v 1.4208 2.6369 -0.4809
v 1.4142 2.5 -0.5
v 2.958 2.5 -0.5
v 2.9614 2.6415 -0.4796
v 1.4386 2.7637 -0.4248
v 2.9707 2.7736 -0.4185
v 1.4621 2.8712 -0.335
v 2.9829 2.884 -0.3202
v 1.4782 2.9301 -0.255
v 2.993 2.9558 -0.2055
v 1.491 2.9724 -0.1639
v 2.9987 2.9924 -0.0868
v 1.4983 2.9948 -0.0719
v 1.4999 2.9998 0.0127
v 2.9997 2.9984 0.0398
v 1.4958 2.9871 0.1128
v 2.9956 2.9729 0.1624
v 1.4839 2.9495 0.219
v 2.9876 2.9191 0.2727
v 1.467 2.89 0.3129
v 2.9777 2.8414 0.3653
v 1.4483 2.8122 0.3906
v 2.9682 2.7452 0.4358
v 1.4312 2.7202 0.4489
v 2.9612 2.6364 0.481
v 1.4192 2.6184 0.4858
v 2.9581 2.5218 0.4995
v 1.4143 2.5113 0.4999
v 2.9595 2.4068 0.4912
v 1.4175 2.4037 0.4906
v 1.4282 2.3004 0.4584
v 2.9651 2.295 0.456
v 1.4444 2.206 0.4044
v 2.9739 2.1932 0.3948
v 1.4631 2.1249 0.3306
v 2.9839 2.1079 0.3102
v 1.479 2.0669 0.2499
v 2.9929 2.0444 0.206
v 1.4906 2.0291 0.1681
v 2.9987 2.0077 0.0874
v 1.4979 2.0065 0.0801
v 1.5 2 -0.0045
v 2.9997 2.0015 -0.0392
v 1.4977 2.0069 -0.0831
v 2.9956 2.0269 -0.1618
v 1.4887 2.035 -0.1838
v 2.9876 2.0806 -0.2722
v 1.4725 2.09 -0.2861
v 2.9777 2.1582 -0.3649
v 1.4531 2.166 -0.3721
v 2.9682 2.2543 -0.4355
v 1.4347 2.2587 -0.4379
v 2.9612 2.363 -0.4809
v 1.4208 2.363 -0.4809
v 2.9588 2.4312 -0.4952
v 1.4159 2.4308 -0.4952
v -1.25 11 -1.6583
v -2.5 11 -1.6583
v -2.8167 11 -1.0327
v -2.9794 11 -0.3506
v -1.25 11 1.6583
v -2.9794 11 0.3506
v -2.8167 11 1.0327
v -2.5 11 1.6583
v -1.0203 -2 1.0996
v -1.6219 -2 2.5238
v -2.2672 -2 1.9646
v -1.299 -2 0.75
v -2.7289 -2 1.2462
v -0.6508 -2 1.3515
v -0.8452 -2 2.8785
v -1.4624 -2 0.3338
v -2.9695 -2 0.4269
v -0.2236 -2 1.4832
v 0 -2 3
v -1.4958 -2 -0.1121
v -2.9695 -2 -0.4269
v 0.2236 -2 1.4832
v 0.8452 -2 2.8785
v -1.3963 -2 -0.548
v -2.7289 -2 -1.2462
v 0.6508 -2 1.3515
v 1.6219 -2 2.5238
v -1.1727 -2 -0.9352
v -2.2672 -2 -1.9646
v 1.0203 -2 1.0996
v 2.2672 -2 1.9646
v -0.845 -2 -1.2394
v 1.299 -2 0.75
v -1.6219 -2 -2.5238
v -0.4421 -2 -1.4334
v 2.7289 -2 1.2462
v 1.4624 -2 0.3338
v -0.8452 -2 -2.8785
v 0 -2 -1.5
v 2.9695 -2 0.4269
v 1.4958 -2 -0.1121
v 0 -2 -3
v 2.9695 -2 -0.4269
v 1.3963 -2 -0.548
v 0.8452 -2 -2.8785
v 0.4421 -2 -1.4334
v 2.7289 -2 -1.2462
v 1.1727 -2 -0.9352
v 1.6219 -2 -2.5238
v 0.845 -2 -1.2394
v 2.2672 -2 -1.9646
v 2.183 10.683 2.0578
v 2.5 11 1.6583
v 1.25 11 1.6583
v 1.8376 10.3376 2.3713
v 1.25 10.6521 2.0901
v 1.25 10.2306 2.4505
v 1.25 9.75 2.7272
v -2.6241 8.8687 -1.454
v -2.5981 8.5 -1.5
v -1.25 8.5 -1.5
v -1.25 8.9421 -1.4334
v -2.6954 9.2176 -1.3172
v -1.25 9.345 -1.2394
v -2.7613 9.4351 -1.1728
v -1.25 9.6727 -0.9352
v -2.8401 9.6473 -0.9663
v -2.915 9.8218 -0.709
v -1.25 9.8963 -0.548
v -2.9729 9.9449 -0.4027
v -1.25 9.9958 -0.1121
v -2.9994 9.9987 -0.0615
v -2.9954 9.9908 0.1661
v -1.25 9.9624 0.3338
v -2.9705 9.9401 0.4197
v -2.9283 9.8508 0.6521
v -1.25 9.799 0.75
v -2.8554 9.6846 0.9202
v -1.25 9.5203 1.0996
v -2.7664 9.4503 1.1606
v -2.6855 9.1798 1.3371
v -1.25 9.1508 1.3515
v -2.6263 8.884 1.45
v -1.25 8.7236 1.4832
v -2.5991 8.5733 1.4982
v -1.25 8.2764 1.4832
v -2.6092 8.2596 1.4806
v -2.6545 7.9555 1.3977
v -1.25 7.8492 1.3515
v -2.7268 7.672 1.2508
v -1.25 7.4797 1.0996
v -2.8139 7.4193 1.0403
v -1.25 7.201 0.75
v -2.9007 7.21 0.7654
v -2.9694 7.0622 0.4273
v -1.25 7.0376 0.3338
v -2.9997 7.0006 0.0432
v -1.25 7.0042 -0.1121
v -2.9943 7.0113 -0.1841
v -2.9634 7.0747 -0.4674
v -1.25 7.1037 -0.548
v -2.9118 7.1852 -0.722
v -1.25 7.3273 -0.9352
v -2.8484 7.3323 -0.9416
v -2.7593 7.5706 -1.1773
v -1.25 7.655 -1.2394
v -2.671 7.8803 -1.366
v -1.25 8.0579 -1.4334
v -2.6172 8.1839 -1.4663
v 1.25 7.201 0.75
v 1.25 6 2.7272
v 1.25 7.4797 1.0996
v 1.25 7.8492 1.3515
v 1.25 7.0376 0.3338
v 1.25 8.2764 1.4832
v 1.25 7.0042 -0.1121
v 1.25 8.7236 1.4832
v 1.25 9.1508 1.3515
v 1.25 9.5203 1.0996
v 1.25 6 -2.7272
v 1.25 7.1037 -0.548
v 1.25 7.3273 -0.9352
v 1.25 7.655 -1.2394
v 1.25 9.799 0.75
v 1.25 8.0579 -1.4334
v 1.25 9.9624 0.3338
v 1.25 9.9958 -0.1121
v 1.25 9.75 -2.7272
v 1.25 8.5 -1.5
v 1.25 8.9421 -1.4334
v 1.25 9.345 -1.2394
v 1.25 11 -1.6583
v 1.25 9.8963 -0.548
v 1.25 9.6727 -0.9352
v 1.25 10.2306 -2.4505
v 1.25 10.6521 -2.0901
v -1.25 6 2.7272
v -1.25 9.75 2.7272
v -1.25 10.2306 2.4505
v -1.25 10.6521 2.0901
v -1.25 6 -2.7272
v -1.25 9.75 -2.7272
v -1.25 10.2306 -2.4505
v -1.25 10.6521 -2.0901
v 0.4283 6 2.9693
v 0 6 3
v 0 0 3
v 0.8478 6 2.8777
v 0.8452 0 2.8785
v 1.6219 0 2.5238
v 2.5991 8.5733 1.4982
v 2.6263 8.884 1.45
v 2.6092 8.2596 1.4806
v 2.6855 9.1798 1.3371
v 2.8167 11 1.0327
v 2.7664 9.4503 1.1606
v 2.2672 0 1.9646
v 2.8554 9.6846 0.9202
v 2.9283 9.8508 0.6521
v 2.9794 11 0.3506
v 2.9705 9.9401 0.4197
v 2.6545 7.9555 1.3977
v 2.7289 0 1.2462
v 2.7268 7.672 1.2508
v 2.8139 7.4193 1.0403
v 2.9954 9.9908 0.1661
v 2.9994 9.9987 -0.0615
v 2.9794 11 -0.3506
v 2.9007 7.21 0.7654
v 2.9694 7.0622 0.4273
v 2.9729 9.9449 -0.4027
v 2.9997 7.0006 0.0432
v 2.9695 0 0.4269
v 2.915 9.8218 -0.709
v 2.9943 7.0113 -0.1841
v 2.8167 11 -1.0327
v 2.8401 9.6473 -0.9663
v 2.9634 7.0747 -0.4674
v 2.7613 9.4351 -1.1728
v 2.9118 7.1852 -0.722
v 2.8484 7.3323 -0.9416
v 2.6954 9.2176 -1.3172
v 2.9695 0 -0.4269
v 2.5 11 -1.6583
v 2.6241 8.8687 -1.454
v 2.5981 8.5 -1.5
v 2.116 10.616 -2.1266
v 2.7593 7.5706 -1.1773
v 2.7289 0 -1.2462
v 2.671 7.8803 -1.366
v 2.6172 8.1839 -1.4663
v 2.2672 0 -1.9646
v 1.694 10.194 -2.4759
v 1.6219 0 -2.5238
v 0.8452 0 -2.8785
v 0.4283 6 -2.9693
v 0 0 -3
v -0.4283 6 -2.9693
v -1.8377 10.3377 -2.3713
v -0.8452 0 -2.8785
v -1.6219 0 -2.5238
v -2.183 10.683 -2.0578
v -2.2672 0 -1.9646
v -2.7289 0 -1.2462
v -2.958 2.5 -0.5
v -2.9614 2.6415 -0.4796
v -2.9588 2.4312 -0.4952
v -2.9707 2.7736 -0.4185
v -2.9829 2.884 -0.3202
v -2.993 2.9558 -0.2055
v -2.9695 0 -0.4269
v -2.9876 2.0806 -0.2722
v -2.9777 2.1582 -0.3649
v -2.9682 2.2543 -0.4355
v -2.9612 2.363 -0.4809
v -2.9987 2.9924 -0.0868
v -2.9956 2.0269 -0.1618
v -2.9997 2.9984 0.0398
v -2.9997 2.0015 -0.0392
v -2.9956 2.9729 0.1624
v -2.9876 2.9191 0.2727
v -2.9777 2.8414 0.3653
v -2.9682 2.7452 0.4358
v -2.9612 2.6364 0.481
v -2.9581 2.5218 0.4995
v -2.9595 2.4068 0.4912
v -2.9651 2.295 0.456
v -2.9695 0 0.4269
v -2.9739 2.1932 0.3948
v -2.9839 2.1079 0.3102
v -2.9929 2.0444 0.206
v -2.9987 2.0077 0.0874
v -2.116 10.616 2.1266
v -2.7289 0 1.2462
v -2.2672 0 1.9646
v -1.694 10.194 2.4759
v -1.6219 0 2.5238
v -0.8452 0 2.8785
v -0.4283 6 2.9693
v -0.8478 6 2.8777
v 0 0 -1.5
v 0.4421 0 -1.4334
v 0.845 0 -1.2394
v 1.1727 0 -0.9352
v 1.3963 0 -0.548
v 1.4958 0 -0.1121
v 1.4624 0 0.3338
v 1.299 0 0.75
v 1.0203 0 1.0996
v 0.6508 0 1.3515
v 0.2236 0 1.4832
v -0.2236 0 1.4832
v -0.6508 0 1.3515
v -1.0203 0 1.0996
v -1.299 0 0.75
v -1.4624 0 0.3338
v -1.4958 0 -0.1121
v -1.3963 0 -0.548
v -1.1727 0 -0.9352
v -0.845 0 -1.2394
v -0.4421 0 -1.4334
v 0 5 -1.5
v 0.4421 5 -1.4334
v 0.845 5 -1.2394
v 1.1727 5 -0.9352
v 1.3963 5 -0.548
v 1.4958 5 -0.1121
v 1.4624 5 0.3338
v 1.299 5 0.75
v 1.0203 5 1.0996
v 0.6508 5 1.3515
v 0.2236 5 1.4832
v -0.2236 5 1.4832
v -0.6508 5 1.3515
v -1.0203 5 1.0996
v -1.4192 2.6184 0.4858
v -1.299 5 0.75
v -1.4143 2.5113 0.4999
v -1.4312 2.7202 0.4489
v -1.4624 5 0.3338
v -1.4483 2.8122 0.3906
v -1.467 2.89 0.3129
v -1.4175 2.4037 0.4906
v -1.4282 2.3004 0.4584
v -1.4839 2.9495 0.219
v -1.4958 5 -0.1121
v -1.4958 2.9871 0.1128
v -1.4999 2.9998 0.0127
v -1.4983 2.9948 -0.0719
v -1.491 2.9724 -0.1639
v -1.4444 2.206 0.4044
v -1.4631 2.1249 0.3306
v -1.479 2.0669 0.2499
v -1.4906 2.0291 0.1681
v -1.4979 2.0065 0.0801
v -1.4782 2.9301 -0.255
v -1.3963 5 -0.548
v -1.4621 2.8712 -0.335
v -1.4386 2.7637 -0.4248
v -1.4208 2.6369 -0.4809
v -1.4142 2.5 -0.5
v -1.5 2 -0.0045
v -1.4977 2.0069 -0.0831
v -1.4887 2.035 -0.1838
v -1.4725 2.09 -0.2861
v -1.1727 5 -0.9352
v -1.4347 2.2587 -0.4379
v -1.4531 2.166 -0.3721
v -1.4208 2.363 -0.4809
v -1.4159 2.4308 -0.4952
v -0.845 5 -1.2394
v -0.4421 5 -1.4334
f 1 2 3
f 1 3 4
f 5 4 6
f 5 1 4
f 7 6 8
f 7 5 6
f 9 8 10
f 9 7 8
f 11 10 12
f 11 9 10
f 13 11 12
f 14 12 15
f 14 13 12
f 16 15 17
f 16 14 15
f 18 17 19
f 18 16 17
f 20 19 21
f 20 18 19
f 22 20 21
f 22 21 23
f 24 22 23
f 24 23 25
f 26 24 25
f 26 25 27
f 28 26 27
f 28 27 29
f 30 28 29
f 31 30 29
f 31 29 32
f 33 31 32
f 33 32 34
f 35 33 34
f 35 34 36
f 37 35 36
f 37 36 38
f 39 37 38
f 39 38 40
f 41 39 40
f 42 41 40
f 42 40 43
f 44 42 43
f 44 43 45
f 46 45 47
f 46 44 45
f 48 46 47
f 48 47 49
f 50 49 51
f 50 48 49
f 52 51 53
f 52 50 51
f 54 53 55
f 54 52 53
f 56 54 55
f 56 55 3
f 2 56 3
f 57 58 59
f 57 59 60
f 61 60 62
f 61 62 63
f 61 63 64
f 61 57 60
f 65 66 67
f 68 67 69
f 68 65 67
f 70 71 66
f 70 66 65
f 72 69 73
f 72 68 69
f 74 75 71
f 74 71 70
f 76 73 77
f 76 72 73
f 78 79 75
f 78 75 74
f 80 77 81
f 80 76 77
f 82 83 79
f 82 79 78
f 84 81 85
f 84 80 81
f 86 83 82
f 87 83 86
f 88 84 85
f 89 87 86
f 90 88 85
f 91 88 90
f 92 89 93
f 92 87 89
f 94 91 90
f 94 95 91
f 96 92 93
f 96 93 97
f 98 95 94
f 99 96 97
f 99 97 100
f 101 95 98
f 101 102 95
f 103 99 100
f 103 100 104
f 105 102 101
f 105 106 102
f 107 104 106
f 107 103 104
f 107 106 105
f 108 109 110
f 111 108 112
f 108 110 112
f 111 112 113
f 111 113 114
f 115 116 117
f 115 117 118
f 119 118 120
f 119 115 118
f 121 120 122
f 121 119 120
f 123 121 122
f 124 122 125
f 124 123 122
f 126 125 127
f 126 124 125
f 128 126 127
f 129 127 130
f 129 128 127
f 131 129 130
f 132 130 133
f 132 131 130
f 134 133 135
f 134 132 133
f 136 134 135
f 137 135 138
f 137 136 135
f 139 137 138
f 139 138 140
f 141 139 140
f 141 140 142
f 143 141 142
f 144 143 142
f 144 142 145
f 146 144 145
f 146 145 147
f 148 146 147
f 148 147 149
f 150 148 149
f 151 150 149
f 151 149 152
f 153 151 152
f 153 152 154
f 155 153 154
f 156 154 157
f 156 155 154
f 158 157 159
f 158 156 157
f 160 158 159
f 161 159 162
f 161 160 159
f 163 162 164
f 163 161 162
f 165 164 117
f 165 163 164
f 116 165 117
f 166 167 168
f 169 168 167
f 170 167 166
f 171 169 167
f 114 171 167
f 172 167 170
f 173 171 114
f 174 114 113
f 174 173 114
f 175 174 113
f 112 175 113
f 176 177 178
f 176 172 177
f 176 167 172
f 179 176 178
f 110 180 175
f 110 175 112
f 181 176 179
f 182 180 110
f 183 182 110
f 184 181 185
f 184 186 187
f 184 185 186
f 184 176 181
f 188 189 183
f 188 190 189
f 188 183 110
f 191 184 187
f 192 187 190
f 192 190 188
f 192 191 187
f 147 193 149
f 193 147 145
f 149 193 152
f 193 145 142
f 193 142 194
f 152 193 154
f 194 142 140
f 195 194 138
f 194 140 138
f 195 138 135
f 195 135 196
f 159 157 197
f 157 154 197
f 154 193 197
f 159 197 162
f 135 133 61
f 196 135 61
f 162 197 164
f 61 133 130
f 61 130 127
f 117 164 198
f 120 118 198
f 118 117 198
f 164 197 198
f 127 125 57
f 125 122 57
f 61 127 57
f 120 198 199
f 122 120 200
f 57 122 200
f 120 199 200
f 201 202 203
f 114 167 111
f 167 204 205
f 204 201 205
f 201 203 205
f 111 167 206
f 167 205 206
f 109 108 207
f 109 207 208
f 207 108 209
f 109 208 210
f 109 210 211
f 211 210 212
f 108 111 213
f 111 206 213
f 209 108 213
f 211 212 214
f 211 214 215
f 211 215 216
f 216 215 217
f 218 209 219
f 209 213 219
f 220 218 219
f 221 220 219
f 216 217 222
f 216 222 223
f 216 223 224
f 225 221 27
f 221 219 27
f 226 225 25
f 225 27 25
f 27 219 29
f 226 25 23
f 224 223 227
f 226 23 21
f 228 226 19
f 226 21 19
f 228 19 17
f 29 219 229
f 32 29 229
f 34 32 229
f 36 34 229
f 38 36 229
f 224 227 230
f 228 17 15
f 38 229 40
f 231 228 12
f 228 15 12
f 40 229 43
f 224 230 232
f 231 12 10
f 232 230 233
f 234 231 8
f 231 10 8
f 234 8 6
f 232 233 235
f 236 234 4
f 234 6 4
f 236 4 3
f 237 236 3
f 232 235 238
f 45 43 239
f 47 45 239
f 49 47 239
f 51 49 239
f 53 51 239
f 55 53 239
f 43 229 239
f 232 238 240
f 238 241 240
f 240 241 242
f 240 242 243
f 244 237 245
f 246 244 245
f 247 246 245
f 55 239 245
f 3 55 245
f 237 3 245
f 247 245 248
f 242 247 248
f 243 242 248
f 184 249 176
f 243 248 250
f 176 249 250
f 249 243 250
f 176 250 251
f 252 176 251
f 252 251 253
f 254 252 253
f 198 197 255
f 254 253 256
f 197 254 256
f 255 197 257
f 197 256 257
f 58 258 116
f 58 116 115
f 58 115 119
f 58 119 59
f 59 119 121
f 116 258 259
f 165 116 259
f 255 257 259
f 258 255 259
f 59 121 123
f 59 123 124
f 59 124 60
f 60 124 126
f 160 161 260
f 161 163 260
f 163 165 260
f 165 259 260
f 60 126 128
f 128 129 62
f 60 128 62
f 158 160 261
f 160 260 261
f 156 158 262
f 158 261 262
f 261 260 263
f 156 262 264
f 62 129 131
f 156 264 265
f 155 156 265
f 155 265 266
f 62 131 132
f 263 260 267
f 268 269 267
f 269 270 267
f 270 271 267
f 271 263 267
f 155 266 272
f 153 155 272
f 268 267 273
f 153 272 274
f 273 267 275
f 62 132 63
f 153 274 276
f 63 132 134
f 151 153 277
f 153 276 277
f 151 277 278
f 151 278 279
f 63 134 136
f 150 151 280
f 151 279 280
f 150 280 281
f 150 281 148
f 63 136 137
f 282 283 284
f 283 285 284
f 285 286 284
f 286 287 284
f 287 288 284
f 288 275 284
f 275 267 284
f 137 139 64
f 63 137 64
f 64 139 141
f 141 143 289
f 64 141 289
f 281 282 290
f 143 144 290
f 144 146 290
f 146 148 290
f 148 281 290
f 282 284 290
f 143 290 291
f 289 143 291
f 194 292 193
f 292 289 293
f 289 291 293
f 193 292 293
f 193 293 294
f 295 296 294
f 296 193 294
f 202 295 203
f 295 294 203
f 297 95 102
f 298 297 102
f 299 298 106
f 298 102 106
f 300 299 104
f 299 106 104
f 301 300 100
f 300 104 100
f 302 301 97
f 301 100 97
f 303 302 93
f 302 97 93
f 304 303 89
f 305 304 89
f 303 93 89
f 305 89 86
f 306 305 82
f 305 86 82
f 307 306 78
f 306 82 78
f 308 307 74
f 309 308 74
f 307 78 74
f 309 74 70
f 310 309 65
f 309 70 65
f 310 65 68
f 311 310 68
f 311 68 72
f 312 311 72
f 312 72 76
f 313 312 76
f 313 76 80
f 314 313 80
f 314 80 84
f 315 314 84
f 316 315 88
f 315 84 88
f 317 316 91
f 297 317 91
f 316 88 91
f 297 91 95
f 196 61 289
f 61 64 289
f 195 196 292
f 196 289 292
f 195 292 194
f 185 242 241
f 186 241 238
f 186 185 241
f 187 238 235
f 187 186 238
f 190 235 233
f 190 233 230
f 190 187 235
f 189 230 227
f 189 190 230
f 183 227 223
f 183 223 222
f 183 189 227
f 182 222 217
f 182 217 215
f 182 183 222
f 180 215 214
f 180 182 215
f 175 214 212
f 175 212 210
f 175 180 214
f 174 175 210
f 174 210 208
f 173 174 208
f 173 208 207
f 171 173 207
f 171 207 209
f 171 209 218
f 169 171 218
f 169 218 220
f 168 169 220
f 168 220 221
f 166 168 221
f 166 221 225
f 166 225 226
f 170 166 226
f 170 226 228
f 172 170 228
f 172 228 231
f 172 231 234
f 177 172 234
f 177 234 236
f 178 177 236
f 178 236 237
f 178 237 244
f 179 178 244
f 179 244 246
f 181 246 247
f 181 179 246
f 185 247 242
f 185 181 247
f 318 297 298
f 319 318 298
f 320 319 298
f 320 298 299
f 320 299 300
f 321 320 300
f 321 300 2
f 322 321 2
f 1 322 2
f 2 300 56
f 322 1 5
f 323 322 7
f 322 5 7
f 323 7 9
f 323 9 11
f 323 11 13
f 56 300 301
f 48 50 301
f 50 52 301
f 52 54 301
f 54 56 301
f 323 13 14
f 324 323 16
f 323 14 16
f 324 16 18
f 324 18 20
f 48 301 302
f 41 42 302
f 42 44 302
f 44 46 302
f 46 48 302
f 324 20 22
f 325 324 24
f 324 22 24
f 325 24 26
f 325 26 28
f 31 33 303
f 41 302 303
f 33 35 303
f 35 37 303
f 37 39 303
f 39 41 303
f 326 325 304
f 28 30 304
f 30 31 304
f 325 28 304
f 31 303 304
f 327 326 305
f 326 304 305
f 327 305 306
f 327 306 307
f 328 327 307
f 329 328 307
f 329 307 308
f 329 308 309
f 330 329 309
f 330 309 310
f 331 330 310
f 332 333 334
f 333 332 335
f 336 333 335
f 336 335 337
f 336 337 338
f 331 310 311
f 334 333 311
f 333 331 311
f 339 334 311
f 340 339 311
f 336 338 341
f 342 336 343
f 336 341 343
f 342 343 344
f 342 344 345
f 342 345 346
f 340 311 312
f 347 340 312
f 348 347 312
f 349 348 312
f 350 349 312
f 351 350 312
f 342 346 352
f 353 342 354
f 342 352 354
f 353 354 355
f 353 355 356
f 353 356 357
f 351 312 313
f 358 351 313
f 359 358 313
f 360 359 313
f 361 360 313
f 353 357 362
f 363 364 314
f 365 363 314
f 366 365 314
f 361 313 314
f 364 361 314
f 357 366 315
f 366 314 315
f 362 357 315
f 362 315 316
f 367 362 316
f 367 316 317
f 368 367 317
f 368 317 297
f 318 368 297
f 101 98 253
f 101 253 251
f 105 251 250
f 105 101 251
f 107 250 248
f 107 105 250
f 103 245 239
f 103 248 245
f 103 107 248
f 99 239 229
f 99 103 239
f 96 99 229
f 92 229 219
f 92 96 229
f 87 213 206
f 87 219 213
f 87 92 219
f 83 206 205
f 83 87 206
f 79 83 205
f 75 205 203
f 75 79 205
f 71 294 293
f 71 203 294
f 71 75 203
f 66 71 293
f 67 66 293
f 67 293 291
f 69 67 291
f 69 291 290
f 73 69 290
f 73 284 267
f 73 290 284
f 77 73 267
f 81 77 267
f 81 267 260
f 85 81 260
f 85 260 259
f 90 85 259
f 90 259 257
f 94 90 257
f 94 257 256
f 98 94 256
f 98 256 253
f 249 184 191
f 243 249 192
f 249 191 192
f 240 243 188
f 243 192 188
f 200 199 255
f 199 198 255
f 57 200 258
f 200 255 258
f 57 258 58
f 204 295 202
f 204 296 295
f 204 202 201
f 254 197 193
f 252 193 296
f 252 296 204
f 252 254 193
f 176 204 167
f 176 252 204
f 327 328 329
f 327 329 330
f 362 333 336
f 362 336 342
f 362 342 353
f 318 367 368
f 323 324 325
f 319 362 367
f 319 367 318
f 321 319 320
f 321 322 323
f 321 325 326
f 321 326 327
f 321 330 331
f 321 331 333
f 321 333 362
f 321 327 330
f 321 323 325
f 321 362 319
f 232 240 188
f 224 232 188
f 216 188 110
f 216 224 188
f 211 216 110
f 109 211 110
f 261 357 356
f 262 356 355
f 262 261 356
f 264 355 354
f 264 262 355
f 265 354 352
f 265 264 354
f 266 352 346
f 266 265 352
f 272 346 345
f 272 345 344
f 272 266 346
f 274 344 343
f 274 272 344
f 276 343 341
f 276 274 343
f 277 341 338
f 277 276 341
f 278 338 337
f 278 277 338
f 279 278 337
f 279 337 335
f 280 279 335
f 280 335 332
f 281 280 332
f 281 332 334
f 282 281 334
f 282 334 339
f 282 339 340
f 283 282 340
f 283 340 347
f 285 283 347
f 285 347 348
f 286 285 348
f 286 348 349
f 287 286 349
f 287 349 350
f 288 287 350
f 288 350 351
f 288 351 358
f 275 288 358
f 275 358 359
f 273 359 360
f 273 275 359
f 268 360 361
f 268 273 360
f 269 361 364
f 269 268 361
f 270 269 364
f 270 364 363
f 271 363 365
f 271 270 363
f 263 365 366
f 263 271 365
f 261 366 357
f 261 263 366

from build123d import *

# Parameters (mm, degrees)
SKETCH_1_R               = 3
EXTRUDE_1_DEPTH          = 11
SKETCH_2_R               = 1.5
CUT_EXTRUDE_1_DEPTH      = 5
CUT_EXTRUDE_2_DEPTH      = 12.789826123
CUT_EXTRUDE_2_DEPTH_BACK = 12.789826123
SKETCH_3_R               = 1.5
SKETCH_3_R_2             = 0.5
CUT_EXTRUDE_3_DEPTH      = 12.789826267
CUT_EXTRUDE_3_DEPTH_BACK = 12.789826267
SKETCH_4_W               = 2.5
SKETCH_4_H               = 5
EXTRUDE_START            = 2
SKETCH_5_R               = 3
SKETCH_5_R_2             = 1.5
EXTRUDE_2_DEPTH          = 2


with BuildPart() as part:
    # 草图1 → 凸台-拉伸1 (new body)
    with BuildSketch(Plane(origin=(0, 0, 0), x_dir=(1, 0, 0), z_dir=(0, 1, 0))):
        with Locations(Location((0, 0, 0), (0, 0, 270))):
            Circle(SKETCH_1_R)
    extrude(amount=EXTRUDE_1_DEPTH)

    # 草图2 → 切除-拉伸1 (cut)
    with BuildSketch(Plane.XZ):
        with Locations(Location((0, 0, 0), (0, 0, 270))):
            Circle(SKETCH_2_R)
    extrude(amount=-CUT_EXTRUDE_1_DEPTH, mode=Mode.SUBTRACT)

    # 草图3 → 切除-拉伸2 (cut, two sides: drawn at the far end of the back side and taken through both)
    with BuildSketch(Plane(origin=(0, 0, 0), x_dir=(0, 0, -1), z_dir=(1, 0, 0)).offset(-CUT_EXTRUDE_2_DEPTH_BACK)):
        with Locations((0, 8.5)):
            Circle(SKETCH_3_R)
        with Locations((0, 2.5)):
            Circle(SKETCH_3_R_2)
        with BuildLine():
            Line((-3, 8.5), (-3, 11))
            Line((-3, 11), (-1.658168408, 11.000095504))
            ThreePointArc((-1.658168408, 11.000095504), (-2.643341183, 9.918713286), (-3, 8.5))
        make_face()
        with BuildLine():
            Line((1.658168408, 11.000095504), (3, 11))
            Line((3, 11), (3, 8.5))
            ThreePointArc((3, 8.5), (2.643341183, 9.918713286), (1.658168408, 11.000095504))
        make_face()
    extrude(amount=CUT_EXTRUDE_2_DEPTH + CUT_EXTRUDE_2_DEPTH_BACK, mode=Mode.SUBTRACT)

    # 草图4 → 切除-拉伸3 (cut, two sides: drawn at the far end of the back side and taken through both)
    with BuildSketch(Plane.XY.offset(-CUT_EXTRUDE_3_DEPTH_BACK)):
        with Locations((0, 8.5)):
            Rectangle(SKETCH_4_W, SKETCH_4_H)
    extrude(amount=CUT_EXTRUDE_3_DEPTH + CUT_EXTRUDE_3_DEPTH_BACK, mode=Mode.SUBTRACT)

    # 草图5 → 凸台-拉伸2 (add)
    with BuildSketch(Plane.XZ.offset(EXTRUDE_START)):
        with Locations(Location((0, 0, 0), (0, 0, 270))):
            Circle(SKETCH_5_R)
        with Locations(Location((0, 0, 0), (0, 0, 270))):
            Circle(SKETCH_5_R_2, mode=Mode.SUBTRACT)
    extrude(amount=-EXTRUDE_2_DEPTH)


solid = part.part
